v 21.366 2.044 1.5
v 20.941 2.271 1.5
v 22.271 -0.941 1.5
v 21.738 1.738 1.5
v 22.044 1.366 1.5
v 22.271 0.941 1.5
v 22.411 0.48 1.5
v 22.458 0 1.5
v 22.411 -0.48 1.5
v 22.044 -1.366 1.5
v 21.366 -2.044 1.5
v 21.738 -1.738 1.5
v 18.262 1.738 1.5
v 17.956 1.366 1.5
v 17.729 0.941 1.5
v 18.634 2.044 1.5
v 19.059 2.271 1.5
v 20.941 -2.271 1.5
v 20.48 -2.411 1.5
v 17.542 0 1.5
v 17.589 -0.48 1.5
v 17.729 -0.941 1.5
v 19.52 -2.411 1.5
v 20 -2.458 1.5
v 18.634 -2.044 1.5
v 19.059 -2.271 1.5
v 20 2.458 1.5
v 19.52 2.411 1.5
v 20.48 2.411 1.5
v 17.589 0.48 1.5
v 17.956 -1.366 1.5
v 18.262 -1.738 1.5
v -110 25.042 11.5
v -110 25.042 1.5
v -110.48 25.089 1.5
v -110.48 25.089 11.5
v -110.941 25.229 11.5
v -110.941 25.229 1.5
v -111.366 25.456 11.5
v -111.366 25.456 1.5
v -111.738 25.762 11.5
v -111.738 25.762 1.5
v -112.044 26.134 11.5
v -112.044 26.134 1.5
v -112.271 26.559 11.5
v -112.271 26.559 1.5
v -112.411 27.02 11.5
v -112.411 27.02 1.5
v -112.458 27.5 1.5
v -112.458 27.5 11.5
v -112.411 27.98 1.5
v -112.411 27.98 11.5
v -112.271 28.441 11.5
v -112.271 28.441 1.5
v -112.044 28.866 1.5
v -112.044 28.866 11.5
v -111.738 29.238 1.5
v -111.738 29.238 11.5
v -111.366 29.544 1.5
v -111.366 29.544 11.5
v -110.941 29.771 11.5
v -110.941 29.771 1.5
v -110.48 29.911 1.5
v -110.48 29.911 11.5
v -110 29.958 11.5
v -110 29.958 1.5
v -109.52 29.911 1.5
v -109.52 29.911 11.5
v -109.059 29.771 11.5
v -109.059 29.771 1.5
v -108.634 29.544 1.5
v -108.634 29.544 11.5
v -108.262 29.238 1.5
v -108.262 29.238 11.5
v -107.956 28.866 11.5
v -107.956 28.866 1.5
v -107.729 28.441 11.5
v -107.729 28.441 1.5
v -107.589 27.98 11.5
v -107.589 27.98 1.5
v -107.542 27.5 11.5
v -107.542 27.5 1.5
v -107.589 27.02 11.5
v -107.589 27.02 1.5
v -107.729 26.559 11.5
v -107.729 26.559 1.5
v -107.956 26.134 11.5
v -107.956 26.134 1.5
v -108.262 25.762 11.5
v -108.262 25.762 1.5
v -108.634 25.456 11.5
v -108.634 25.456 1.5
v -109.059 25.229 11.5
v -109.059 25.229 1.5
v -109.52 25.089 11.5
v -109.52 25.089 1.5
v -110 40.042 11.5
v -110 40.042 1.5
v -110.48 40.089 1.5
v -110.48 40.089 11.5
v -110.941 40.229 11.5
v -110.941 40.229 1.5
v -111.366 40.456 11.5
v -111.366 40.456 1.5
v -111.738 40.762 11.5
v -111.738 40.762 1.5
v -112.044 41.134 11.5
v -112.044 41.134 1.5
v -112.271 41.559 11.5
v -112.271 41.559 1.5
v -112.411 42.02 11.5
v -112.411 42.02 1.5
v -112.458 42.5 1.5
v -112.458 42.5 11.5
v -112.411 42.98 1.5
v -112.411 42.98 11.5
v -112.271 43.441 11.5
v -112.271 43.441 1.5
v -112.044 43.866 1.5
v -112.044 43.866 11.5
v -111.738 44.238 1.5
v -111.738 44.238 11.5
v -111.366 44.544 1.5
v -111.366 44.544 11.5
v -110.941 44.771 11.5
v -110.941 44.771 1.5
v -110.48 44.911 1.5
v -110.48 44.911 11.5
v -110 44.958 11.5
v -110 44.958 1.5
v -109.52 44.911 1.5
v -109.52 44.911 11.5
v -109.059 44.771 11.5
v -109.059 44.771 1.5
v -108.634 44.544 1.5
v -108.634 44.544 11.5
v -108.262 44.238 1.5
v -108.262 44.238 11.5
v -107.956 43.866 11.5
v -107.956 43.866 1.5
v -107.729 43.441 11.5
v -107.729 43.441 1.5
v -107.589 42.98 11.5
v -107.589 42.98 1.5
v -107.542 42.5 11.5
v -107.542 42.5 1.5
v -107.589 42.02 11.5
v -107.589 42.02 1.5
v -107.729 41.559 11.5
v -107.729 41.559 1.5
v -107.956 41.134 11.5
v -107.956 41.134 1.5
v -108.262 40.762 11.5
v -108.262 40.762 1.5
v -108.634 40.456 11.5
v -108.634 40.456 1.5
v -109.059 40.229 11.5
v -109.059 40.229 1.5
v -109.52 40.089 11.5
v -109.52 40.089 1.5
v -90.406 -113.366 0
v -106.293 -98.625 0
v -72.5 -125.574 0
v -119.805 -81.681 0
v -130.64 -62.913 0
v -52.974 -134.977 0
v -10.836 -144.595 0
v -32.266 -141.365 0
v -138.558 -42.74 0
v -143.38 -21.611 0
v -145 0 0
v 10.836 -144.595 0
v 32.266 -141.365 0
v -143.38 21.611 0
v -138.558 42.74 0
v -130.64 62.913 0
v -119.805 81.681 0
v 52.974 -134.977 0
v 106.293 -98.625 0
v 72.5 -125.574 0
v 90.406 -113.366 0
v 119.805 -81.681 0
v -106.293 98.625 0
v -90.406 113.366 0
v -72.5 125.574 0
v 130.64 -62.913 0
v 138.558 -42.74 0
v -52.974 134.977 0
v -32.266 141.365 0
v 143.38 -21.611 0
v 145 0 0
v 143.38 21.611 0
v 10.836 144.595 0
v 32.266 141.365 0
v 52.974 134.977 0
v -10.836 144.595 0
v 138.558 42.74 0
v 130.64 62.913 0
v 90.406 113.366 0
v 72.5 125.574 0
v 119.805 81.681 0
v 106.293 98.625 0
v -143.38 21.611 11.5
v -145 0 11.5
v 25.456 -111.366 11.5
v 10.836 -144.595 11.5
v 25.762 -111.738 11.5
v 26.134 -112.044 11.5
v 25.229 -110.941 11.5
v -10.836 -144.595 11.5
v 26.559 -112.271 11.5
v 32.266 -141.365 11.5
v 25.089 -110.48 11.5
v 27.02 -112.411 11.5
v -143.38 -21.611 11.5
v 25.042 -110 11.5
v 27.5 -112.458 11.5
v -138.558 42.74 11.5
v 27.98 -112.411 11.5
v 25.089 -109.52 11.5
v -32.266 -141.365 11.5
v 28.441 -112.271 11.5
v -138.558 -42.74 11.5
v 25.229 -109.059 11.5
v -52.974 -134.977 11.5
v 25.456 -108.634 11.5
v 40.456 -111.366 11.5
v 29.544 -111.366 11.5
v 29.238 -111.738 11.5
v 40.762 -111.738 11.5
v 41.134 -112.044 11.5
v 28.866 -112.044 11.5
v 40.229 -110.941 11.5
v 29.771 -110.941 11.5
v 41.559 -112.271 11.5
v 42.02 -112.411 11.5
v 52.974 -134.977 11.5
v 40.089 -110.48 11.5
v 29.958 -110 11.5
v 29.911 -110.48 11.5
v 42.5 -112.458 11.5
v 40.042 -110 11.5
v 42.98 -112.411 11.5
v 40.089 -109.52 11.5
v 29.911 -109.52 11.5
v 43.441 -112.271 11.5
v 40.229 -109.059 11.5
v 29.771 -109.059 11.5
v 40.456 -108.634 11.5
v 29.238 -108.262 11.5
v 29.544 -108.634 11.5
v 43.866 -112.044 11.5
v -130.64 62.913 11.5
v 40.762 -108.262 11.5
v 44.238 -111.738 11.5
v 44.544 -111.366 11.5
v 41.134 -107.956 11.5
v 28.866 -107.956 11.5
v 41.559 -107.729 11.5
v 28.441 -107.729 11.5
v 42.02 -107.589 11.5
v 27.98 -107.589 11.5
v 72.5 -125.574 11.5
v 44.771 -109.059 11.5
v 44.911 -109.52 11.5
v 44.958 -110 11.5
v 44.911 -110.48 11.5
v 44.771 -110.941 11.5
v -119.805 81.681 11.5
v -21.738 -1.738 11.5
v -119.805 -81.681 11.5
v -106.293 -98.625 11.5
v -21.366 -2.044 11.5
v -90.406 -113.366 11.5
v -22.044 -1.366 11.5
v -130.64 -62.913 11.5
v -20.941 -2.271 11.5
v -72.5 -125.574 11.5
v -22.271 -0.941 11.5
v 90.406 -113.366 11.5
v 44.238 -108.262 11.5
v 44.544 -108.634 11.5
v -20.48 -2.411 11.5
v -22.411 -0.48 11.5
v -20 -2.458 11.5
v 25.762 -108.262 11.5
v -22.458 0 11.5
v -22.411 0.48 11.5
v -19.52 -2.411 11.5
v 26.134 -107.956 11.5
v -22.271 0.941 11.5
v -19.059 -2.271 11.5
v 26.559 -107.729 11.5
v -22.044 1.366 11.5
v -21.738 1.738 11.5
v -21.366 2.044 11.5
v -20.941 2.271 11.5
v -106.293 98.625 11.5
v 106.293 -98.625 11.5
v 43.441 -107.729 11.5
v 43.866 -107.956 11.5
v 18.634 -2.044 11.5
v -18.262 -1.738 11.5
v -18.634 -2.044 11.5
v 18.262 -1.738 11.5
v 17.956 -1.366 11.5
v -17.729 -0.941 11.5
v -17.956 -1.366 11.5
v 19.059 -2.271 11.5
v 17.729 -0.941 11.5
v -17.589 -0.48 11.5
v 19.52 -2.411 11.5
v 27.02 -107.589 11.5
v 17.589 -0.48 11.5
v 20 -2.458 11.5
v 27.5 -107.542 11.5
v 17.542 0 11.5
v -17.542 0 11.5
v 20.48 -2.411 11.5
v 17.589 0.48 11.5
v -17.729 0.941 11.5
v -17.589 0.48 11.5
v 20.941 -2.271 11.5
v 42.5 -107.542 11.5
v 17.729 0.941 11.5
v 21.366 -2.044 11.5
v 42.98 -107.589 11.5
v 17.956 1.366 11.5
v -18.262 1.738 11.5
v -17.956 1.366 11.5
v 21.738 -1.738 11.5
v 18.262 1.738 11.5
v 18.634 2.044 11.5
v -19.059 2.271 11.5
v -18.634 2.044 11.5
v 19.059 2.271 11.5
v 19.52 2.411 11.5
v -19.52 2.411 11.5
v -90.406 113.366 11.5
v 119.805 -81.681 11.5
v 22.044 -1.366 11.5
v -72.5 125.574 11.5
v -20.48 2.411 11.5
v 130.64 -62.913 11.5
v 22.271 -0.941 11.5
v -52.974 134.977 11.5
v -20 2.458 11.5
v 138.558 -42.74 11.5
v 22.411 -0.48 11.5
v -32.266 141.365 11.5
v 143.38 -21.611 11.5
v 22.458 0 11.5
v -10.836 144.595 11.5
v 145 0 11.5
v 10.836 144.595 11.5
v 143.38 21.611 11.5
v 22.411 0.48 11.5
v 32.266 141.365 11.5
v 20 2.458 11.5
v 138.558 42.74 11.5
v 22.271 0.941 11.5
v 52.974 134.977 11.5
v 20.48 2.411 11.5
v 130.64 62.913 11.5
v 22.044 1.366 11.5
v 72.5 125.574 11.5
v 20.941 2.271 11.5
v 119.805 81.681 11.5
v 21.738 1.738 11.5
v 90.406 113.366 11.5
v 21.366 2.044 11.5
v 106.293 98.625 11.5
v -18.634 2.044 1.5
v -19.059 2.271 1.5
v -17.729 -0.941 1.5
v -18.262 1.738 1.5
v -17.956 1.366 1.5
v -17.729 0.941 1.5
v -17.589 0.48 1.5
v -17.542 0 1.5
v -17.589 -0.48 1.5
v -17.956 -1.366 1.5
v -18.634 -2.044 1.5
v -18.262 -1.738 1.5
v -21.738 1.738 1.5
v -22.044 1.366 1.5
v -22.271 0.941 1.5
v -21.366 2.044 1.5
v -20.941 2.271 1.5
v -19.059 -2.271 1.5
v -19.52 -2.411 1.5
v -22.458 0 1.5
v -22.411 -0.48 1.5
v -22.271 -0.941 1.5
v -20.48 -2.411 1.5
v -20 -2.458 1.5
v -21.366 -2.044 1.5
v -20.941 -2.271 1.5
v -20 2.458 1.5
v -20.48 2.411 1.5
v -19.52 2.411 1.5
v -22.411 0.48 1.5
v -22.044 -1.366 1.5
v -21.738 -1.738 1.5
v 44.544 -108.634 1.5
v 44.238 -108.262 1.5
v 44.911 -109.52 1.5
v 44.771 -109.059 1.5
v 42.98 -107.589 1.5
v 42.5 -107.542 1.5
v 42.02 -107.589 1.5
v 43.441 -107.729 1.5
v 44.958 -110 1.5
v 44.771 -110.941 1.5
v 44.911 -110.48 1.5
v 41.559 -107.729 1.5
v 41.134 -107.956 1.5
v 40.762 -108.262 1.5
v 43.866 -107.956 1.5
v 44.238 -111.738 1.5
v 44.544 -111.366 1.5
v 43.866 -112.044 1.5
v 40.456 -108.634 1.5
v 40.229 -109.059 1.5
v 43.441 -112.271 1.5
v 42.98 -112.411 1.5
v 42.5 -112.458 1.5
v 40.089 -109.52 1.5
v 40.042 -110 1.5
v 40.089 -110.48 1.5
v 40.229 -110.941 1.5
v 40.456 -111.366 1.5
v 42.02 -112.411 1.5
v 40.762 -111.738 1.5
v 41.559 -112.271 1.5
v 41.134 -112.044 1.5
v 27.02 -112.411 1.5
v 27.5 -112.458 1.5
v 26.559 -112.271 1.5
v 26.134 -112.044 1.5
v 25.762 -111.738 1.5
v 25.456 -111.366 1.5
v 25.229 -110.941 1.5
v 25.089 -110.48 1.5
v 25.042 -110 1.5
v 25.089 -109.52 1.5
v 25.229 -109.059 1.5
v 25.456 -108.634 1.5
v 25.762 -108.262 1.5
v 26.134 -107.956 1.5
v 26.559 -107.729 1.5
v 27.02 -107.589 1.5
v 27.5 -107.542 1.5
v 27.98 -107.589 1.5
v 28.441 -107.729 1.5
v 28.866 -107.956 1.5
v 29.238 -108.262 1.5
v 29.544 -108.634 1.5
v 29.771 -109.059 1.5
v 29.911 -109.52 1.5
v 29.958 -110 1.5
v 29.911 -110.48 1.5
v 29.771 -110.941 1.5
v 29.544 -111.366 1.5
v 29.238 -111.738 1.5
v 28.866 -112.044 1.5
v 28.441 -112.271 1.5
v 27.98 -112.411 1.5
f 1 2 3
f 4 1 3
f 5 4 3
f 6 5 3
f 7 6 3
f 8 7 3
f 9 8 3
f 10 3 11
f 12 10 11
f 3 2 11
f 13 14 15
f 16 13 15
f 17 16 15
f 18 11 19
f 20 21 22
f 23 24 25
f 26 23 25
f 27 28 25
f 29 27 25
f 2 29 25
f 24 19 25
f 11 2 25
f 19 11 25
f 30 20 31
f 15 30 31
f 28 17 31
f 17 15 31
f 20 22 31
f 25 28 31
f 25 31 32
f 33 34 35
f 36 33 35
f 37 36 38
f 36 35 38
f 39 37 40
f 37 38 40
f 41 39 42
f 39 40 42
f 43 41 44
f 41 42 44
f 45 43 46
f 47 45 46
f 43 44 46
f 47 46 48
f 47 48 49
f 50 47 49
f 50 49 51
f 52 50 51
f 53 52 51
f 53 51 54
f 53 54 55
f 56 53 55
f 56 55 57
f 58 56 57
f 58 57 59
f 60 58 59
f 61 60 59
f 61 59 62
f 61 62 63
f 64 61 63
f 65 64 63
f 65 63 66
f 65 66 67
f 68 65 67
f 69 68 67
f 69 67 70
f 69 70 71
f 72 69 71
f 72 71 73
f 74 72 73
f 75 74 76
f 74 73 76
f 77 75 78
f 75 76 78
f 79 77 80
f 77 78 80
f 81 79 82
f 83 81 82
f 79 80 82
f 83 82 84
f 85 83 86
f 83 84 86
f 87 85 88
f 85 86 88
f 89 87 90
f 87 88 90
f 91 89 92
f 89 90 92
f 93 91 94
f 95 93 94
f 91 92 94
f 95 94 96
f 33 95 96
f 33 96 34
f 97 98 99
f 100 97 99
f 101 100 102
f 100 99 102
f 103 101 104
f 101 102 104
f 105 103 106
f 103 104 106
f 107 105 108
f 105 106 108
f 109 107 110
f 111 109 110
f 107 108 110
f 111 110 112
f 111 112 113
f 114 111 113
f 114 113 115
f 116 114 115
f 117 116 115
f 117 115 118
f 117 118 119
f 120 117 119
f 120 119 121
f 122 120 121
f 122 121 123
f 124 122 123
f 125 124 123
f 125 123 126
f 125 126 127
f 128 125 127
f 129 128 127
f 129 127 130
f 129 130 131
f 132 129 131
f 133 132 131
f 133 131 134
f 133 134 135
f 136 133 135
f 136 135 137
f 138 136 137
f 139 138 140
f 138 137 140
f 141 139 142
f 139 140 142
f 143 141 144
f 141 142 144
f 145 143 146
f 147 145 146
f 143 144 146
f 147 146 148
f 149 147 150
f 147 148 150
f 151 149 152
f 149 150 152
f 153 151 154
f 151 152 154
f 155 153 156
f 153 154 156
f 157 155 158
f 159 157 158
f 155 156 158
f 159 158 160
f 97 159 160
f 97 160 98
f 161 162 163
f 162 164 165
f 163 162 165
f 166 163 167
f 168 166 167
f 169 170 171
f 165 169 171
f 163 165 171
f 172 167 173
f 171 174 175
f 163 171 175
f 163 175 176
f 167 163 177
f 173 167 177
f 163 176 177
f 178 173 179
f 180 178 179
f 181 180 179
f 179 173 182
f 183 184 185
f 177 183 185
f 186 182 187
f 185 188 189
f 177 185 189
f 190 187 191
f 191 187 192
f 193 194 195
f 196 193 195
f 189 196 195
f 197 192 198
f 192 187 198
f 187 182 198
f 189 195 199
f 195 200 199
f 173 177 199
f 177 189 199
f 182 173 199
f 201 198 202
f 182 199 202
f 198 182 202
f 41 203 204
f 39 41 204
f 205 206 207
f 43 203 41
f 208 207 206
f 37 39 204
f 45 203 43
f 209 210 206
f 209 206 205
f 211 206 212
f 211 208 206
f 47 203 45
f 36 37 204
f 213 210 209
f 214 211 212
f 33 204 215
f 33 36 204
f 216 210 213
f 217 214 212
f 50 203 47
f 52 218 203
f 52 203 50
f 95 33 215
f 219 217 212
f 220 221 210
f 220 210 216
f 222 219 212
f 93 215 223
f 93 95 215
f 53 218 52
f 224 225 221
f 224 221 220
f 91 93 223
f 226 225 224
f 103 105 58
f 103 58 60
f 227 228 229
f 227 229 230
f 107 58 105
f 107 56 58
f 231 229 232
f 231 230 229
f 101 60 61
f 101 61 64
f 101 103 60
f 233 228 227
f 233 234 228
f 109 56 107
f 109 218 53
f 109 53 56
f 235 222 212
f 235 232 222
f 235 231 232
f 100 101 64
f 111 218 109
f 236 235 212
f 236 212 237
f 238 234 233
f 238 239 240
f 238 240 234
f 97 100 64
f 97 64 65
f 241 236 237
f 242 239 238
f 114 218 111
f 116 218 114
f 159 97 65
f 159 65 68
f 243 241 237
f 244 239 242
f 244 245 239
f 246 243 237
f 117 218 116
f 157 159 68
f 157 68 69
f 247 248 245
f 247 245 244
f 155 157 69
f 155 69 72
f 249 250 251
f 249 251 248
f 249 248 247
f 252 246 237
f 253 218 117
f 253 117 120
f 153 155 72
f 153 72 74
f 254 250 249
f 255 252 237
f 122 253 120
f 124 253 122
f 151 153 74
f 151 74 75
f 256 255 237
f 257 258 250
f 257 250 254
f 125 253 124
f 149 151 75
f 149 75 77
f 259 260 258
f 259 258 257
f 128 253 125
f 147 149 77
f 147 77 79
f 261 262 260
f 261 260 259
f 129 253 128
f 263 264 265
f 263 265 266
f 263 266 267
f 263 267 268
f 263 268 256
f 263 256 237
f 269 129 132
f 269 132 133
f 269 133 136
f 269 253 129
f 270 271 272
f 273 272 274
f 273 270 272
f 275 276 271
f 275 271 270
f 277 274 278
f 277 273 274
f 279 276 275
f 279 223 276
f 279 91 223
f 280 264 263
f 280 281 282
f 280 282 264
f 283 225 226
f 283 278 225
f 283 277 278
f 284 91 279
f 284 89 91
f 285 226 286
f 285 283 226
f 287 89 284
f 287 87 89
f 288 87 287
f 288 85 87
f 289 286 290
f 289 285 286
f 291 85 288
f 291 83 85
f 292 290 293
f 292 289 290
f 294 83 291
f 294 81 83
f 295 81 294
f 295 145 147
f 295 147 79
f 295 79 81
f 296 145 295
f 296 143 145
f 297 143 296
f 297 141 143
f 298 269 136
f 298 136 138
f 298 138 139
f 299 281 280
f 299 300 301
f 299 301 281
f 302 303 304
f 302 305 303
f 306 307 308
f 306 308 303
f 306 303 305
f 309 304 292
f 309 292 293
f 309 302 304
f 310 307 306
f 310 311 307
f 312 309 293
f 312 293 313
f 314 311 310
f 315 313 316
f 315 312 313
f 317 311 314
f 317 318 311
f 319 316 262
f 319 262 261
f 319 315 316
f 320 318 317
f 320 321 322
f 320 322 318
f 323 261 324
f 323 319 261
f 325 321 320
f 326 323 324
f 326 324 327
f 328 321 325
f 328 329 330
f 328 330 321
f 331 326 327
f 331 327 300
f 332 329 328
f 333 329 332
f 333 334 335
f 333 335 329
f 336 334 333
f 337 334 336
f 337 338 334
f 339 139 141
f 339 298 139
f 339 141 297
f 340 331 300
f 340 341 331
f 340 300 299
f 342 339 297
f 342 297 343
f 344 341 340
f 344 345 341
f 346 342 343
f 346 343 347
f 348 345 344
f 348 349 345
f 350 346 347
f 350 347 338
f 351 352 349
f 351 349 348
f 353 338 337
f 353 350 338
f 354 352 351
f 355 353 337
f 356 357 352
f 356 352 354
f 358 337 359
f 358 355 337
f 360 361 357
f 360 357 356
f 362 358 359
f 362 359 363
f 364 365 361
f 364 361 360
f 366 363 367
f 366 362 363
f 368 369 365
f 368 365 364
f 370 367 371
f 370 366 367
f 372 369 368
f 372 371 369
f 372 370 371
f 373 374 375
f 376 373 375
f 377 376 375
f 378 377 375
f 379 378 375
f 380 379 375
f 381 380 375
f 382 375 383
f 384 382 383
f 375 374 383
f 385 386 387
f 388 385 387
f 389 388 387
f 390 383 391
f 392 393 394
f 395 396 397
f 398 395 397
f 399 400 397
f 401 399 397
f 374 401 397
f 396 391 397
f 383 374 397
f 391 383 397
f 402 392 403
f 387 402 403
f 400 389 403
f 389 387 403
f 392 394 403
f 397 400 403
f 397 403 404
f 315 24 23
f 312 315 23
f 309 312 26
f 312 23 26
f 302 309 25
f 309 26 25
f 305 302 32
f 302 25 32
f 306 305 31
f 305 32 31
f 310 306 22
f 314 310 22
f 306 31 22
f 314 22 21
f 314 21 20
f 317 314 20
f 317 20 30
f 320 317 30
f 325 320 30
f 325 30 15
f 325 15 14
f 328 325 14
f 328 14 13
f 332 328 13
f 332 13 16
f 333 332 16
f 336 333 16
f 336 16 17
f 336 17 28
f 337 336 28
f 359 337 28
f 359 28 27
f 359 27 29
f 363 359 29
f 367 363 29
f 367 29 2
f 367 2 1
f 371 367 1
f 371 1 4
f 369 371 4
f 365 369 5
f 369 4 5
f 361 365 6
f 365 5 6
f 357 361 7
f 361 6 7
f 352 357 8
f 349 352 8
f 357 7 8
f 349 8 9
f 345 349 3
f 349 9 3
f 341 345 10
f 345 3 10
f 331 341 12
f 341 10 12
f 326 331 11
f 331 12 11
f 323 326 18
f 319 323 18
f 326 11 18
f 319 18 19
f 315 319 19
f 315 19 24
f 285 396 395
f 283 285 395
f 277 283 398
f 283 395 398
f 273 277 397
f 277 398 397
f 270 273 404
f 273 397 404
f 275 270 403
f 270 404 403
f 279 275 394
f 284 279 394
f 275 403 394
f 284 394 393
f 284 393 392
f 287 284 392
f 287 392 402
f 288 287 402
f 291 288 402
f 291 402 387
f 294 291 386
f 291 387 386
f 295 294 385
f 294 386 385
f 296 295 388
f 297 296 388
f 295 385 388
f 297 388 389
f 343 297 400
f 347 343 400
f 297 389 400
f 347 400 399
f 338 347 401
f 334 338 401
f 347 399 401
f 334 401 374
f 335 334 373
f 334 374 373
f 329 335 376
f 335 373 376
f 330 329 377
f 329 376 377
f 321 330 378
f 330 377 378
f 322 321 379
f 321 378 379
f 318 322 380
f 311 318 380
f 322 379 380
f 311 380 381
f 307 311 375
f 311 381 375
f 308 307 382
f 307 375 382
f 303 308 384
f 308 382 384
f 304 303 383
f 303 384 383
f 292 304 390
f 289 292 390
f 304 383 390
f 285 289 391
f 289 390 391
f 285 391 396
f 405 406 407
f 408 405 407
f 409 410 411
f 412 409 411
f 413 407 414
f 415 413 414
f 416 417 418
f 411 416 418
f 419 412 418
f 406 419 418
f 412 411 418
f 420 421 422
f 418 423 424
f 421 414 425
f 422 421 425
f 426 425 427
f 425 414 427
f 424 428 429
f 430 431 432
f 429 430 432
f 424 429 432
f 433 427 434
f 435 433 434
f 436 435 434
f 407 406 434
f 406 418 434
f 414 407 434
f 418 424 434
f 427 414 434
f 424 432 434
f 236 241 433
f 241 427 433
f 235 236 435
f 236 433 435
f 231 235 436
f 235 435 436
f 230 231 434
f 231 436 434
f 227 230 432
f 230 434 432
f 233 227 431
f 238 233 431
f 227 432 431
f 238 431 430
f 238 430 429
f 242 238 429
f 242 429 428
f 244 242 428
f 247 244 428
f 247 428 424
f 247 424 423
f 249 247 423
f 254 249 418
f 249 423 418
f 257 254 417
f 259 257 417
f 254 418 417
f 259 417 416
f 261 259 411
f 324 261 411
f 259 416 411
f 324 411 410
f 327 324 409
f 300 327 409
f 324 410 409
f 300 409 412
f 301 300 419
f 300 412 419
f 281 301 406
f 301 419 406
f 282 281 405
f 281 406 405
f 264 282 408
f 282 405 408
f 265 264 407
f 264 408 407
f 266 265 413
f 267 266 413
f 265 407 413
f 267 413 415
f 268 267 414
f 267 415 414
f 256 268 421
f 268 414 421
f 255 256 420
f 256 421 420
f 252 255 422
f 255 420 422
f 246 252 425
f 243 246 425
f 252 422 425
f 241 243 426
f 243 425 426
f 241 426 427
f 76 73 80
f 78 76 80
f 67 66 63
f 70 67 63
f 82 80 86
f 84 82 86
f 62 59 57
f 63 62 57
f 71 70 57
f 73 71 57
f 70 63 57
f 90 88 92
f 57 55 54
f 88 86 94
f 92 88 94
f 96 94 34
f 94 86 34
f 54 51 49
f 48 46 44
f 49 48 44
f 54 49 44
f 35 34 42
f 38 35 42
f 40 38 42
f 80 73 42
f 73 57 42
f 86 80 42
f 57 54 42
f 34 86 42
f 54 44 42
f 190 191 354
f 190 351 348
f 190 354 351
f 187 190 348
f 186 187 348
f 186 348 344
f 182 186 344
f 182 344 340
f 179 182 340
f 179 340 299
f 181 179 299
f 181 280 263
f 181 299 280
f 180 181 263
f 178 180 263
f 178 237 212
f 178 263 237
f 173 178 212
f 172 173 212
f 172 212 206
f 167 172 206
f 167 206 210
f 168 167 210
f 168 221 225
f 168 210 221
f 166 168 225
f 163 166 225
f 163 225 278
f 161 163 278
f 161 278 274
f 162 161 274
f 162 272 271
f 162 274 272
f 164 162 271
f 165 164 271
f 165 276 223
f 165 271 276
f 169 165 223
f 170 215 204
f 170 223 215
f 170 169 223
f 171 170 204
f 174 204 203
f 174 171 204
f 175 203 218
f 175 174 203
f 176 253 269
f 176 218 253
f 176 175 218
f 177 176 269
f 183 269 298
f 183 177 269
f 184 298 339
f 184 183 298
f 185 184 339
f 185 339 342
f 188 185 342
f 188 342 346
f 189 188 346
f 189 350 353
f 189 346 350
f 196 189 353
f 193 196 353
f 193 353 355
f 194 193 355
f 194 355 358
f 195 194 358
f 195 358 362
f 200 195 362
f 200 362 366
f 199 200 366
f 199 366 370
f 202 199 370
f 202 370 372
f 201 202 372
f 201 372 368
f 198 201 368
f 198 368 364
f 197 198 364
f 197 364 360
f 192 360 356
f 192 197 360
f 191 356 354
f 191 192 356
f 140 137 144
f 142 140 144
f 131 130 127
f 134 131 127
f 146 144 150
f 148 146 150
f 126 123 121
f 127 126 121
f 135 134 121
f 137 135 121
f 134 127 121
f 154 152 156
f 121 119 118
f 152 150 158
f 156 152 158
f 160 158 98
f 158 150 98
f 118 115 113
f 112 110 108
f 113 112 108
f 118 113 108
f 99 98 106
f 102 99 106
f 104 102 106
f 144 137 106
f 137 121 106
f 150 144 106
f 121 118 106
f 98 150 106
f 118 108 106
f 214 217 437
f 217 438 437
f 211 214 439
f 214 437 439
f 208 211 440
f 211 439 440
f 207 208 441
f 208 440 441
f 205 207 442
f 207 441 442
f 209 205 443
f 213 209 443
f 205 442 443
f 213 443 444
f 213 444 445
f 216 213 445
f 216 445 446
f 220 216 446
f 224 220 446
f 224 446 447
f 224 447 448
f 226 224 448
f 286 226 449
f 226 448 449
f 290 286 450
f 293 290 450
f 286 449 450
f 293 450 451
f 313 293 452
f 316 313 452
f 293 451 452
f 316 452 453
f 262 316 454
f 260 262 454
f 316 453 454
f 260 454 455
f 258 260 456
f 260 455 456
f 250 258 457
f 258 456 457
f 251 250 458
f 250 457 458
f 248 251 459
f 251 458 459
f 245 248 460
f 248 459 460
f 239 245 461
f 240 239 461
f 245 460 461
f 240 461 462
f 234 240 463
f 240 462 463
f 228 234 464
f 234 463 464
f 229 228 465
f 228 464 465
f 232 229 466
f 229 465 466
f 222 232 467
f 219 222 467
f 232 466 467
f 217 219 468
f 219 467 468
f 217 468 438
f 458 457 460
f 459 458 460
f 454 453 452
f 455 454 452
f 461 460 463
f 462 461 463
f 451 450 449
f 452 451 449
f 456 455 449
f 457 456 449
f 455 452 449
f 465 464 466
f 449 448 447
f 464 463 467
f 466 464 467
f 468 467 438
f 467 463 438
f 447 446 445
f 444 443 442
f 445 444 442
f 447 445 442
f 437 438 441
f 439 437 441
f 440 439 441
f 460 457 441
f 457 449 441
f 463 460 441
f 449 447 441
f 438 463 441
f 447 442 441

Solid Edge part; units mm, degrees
sketch "Sketch1" plane through (0, 0, 0) normal (0, 0, 1) x (1, 0, 0)
  circle A0 centre (0, 0) radius 145
extrude "Protrusion1" add sketch "Sketch1" along normal blind 11.5
hole "Bohrung_1" at (-20, 0, 11.5) direction (0, 0, -1) diameter 4.917 depth 10 thread major 6 thread length 8
hole "Hole1" at (20, 0, 11.5) direction (0, 0, -1) diameter 4.917 depth 10 thread major 6 thread length 8
hole "Bohrung_3" at (-110, 42.5, 11.5) direction (0, 0, -1) diameter 4.917 depth 10 thread major 6 thread length 8
hole "Hole2" at (-110, 27.5, 11.5) direction (0, 0, -1) diameter 4.917 depth 10 thread major 6 thread length 8
hole "Bohrung_9" at (42.5, -110, 11.5) direction (0, 0, -1) diameter 4.917 depth 10 thread major 6 thread length 8
hole "Hole3" at (27.5, -110, 11.5) direction (0, 0, -1) diameter 4.917 depth 10 thread major 6 thread length 8
